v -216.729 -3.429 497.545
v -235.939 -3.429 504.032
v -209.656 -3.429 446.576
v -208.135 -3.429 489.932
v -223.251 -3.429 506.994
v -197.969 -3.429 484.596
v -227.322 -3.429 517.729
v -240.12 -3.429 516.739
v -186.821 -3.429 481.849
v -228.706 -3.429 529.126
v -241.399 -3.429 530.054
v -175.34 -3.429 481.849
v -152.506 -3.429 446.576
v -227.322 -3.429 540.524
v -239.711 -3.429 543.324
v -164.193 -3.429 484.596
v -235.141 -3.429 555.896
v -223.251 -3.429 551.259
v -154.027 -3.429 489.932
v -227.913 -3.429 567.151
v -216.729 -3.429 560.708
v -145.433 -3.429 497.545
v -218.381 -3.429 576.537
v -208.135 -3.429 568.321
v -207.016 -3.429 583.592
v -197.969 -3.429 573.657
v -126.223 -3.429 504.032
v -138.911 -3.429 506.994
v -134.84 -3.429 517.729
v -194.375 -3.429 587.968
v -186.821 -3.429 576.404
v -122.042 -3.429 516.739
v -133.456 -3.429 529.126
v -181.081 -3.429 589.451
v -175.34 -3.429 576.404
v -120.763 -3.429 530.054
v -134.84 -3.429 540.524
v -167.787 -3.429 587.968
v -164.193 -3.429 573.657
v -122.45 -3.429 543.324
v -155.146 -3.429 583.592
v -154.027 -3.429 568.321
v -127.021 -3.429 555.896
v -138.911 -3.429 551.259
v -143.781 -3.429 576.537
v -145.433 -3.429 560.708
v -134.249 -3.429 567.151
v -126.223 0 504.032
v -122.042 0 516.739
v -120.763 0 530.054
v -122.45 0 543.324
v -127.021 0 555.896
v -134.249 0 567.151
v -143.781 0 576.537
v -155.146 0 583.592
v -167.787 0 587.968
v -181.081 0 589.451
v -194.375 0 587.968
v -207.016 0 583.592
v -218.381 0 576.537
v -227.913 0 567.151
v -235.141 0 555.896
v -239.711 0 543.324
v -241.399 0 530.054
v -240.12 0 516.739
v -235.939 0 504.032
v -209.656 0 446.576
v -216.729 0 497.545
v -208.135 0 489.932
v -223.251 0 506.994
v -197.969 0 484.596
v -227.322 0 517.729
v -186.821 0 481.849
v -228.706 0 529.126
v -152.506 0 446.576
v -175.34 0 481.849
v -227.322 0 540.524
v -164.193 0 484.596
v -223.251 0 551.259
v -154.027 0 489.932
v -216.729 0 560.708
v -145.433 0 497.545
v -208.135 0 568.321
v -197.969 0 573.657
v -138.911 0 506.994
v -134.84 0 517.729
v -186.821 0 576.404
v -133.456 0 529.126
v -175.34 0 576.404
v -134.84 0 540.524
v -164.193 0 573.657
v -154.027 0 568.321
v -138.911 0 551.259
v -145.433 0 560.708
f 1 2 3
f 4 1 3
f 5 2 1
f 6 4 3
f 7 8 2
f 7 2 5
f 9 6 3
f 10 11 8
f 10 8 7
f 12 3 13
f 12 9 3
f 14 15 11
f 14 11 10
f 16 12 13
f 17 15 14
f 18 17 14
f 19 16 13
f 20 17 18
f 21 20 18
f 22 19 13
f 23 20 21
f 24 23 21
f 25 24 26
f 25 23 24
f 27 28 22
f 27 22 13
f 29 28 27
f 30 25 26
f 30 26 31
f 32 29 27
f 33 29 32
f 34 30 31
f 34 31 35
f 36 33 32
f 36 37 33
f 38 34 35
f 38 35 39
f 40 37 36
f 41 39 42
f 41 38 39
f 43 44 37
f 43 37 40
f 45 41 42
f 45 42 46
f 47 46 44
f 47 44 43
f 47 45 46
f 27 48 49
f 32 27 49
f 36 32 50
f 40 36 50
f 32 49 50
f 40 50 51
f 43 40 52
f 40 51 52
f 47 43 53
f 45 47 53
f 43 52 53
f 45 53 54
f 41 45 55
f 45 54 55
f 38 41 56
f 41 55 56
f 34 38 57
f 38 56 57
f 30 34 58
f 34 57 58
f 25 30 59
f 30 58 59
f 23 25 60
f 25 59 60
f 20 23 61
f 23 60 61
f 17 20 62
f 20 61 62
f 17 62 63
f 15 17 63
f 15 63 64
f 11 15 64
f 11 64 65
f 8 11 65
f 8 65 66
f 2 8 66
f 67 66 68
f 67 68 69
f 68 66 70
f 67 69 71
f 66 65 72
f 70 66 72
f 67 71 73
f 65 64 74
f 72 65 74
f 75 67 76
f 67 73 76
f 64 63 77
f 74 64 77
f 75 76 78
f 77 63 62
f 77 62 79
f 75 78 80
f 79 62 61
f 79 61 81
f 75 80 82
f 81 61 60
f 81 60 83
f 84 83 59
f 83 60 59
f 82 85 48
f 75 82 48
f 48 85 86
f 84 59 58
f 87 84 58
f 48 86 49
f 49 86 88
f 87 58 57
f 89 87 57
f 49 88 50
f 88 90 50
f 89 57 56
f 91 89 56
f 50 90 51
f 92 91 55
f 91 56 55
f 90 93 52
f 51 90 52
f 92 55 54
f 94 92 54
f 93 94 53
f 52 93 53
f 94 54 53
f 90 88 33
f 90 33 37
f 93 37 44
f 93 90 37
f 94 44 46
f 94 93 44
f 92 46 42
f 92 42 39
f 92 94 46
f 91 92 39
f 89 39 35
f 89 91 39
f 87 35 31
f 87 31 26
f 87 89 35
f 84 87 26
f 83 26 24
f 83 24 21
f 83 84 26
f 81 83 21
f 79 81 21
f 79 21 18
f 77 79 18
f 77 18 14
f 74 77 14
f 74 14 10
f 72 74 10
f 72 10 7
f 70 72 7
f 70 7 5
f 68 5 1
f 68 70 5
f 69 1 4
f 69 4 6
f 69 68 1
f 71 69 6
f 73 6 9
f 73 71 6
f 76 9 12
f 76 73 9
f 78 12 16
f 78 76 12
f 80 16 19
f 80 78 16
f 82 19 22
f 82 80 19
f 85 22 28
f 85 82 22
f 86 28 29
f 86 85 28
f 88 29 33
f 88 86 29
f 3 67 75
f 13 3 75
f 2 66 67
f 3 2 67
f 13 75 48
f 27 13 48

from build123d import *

# Parameters (mm, degrees)
F0_R     = 47.625
F1_DEPTH = 3.429


# Not quite as in the source:
# - ends of sketch curves that miss each other by under 0.0002 mm in the source are joined


with BuildPart() as f1:
    # F0 (on Front) → F1 (new body)
    with BuildSketch(Plane.XZ):
        with BuildLine():
            Line((-235.938695, 504.0320628), (-209.655918, 446.5764754))
            Line((-209.655918, 446.5764754), (-152.505918, 446.5764754))
            Line((-152.505918, 446.5764754), (-126.223141, 504.0320628))
            ThreePointArc((-126.223141, 504.0320628), (-181.080918, 589.4514754), (-235.938695, 504.0320628))
        make_face()
        with Locations((-181.080918, 529.1264754)):
            Circle(F0_R, mode=Mode.SUBTRACT)
    extrude(amount=F1_DEPTH)


solid = f1.part
